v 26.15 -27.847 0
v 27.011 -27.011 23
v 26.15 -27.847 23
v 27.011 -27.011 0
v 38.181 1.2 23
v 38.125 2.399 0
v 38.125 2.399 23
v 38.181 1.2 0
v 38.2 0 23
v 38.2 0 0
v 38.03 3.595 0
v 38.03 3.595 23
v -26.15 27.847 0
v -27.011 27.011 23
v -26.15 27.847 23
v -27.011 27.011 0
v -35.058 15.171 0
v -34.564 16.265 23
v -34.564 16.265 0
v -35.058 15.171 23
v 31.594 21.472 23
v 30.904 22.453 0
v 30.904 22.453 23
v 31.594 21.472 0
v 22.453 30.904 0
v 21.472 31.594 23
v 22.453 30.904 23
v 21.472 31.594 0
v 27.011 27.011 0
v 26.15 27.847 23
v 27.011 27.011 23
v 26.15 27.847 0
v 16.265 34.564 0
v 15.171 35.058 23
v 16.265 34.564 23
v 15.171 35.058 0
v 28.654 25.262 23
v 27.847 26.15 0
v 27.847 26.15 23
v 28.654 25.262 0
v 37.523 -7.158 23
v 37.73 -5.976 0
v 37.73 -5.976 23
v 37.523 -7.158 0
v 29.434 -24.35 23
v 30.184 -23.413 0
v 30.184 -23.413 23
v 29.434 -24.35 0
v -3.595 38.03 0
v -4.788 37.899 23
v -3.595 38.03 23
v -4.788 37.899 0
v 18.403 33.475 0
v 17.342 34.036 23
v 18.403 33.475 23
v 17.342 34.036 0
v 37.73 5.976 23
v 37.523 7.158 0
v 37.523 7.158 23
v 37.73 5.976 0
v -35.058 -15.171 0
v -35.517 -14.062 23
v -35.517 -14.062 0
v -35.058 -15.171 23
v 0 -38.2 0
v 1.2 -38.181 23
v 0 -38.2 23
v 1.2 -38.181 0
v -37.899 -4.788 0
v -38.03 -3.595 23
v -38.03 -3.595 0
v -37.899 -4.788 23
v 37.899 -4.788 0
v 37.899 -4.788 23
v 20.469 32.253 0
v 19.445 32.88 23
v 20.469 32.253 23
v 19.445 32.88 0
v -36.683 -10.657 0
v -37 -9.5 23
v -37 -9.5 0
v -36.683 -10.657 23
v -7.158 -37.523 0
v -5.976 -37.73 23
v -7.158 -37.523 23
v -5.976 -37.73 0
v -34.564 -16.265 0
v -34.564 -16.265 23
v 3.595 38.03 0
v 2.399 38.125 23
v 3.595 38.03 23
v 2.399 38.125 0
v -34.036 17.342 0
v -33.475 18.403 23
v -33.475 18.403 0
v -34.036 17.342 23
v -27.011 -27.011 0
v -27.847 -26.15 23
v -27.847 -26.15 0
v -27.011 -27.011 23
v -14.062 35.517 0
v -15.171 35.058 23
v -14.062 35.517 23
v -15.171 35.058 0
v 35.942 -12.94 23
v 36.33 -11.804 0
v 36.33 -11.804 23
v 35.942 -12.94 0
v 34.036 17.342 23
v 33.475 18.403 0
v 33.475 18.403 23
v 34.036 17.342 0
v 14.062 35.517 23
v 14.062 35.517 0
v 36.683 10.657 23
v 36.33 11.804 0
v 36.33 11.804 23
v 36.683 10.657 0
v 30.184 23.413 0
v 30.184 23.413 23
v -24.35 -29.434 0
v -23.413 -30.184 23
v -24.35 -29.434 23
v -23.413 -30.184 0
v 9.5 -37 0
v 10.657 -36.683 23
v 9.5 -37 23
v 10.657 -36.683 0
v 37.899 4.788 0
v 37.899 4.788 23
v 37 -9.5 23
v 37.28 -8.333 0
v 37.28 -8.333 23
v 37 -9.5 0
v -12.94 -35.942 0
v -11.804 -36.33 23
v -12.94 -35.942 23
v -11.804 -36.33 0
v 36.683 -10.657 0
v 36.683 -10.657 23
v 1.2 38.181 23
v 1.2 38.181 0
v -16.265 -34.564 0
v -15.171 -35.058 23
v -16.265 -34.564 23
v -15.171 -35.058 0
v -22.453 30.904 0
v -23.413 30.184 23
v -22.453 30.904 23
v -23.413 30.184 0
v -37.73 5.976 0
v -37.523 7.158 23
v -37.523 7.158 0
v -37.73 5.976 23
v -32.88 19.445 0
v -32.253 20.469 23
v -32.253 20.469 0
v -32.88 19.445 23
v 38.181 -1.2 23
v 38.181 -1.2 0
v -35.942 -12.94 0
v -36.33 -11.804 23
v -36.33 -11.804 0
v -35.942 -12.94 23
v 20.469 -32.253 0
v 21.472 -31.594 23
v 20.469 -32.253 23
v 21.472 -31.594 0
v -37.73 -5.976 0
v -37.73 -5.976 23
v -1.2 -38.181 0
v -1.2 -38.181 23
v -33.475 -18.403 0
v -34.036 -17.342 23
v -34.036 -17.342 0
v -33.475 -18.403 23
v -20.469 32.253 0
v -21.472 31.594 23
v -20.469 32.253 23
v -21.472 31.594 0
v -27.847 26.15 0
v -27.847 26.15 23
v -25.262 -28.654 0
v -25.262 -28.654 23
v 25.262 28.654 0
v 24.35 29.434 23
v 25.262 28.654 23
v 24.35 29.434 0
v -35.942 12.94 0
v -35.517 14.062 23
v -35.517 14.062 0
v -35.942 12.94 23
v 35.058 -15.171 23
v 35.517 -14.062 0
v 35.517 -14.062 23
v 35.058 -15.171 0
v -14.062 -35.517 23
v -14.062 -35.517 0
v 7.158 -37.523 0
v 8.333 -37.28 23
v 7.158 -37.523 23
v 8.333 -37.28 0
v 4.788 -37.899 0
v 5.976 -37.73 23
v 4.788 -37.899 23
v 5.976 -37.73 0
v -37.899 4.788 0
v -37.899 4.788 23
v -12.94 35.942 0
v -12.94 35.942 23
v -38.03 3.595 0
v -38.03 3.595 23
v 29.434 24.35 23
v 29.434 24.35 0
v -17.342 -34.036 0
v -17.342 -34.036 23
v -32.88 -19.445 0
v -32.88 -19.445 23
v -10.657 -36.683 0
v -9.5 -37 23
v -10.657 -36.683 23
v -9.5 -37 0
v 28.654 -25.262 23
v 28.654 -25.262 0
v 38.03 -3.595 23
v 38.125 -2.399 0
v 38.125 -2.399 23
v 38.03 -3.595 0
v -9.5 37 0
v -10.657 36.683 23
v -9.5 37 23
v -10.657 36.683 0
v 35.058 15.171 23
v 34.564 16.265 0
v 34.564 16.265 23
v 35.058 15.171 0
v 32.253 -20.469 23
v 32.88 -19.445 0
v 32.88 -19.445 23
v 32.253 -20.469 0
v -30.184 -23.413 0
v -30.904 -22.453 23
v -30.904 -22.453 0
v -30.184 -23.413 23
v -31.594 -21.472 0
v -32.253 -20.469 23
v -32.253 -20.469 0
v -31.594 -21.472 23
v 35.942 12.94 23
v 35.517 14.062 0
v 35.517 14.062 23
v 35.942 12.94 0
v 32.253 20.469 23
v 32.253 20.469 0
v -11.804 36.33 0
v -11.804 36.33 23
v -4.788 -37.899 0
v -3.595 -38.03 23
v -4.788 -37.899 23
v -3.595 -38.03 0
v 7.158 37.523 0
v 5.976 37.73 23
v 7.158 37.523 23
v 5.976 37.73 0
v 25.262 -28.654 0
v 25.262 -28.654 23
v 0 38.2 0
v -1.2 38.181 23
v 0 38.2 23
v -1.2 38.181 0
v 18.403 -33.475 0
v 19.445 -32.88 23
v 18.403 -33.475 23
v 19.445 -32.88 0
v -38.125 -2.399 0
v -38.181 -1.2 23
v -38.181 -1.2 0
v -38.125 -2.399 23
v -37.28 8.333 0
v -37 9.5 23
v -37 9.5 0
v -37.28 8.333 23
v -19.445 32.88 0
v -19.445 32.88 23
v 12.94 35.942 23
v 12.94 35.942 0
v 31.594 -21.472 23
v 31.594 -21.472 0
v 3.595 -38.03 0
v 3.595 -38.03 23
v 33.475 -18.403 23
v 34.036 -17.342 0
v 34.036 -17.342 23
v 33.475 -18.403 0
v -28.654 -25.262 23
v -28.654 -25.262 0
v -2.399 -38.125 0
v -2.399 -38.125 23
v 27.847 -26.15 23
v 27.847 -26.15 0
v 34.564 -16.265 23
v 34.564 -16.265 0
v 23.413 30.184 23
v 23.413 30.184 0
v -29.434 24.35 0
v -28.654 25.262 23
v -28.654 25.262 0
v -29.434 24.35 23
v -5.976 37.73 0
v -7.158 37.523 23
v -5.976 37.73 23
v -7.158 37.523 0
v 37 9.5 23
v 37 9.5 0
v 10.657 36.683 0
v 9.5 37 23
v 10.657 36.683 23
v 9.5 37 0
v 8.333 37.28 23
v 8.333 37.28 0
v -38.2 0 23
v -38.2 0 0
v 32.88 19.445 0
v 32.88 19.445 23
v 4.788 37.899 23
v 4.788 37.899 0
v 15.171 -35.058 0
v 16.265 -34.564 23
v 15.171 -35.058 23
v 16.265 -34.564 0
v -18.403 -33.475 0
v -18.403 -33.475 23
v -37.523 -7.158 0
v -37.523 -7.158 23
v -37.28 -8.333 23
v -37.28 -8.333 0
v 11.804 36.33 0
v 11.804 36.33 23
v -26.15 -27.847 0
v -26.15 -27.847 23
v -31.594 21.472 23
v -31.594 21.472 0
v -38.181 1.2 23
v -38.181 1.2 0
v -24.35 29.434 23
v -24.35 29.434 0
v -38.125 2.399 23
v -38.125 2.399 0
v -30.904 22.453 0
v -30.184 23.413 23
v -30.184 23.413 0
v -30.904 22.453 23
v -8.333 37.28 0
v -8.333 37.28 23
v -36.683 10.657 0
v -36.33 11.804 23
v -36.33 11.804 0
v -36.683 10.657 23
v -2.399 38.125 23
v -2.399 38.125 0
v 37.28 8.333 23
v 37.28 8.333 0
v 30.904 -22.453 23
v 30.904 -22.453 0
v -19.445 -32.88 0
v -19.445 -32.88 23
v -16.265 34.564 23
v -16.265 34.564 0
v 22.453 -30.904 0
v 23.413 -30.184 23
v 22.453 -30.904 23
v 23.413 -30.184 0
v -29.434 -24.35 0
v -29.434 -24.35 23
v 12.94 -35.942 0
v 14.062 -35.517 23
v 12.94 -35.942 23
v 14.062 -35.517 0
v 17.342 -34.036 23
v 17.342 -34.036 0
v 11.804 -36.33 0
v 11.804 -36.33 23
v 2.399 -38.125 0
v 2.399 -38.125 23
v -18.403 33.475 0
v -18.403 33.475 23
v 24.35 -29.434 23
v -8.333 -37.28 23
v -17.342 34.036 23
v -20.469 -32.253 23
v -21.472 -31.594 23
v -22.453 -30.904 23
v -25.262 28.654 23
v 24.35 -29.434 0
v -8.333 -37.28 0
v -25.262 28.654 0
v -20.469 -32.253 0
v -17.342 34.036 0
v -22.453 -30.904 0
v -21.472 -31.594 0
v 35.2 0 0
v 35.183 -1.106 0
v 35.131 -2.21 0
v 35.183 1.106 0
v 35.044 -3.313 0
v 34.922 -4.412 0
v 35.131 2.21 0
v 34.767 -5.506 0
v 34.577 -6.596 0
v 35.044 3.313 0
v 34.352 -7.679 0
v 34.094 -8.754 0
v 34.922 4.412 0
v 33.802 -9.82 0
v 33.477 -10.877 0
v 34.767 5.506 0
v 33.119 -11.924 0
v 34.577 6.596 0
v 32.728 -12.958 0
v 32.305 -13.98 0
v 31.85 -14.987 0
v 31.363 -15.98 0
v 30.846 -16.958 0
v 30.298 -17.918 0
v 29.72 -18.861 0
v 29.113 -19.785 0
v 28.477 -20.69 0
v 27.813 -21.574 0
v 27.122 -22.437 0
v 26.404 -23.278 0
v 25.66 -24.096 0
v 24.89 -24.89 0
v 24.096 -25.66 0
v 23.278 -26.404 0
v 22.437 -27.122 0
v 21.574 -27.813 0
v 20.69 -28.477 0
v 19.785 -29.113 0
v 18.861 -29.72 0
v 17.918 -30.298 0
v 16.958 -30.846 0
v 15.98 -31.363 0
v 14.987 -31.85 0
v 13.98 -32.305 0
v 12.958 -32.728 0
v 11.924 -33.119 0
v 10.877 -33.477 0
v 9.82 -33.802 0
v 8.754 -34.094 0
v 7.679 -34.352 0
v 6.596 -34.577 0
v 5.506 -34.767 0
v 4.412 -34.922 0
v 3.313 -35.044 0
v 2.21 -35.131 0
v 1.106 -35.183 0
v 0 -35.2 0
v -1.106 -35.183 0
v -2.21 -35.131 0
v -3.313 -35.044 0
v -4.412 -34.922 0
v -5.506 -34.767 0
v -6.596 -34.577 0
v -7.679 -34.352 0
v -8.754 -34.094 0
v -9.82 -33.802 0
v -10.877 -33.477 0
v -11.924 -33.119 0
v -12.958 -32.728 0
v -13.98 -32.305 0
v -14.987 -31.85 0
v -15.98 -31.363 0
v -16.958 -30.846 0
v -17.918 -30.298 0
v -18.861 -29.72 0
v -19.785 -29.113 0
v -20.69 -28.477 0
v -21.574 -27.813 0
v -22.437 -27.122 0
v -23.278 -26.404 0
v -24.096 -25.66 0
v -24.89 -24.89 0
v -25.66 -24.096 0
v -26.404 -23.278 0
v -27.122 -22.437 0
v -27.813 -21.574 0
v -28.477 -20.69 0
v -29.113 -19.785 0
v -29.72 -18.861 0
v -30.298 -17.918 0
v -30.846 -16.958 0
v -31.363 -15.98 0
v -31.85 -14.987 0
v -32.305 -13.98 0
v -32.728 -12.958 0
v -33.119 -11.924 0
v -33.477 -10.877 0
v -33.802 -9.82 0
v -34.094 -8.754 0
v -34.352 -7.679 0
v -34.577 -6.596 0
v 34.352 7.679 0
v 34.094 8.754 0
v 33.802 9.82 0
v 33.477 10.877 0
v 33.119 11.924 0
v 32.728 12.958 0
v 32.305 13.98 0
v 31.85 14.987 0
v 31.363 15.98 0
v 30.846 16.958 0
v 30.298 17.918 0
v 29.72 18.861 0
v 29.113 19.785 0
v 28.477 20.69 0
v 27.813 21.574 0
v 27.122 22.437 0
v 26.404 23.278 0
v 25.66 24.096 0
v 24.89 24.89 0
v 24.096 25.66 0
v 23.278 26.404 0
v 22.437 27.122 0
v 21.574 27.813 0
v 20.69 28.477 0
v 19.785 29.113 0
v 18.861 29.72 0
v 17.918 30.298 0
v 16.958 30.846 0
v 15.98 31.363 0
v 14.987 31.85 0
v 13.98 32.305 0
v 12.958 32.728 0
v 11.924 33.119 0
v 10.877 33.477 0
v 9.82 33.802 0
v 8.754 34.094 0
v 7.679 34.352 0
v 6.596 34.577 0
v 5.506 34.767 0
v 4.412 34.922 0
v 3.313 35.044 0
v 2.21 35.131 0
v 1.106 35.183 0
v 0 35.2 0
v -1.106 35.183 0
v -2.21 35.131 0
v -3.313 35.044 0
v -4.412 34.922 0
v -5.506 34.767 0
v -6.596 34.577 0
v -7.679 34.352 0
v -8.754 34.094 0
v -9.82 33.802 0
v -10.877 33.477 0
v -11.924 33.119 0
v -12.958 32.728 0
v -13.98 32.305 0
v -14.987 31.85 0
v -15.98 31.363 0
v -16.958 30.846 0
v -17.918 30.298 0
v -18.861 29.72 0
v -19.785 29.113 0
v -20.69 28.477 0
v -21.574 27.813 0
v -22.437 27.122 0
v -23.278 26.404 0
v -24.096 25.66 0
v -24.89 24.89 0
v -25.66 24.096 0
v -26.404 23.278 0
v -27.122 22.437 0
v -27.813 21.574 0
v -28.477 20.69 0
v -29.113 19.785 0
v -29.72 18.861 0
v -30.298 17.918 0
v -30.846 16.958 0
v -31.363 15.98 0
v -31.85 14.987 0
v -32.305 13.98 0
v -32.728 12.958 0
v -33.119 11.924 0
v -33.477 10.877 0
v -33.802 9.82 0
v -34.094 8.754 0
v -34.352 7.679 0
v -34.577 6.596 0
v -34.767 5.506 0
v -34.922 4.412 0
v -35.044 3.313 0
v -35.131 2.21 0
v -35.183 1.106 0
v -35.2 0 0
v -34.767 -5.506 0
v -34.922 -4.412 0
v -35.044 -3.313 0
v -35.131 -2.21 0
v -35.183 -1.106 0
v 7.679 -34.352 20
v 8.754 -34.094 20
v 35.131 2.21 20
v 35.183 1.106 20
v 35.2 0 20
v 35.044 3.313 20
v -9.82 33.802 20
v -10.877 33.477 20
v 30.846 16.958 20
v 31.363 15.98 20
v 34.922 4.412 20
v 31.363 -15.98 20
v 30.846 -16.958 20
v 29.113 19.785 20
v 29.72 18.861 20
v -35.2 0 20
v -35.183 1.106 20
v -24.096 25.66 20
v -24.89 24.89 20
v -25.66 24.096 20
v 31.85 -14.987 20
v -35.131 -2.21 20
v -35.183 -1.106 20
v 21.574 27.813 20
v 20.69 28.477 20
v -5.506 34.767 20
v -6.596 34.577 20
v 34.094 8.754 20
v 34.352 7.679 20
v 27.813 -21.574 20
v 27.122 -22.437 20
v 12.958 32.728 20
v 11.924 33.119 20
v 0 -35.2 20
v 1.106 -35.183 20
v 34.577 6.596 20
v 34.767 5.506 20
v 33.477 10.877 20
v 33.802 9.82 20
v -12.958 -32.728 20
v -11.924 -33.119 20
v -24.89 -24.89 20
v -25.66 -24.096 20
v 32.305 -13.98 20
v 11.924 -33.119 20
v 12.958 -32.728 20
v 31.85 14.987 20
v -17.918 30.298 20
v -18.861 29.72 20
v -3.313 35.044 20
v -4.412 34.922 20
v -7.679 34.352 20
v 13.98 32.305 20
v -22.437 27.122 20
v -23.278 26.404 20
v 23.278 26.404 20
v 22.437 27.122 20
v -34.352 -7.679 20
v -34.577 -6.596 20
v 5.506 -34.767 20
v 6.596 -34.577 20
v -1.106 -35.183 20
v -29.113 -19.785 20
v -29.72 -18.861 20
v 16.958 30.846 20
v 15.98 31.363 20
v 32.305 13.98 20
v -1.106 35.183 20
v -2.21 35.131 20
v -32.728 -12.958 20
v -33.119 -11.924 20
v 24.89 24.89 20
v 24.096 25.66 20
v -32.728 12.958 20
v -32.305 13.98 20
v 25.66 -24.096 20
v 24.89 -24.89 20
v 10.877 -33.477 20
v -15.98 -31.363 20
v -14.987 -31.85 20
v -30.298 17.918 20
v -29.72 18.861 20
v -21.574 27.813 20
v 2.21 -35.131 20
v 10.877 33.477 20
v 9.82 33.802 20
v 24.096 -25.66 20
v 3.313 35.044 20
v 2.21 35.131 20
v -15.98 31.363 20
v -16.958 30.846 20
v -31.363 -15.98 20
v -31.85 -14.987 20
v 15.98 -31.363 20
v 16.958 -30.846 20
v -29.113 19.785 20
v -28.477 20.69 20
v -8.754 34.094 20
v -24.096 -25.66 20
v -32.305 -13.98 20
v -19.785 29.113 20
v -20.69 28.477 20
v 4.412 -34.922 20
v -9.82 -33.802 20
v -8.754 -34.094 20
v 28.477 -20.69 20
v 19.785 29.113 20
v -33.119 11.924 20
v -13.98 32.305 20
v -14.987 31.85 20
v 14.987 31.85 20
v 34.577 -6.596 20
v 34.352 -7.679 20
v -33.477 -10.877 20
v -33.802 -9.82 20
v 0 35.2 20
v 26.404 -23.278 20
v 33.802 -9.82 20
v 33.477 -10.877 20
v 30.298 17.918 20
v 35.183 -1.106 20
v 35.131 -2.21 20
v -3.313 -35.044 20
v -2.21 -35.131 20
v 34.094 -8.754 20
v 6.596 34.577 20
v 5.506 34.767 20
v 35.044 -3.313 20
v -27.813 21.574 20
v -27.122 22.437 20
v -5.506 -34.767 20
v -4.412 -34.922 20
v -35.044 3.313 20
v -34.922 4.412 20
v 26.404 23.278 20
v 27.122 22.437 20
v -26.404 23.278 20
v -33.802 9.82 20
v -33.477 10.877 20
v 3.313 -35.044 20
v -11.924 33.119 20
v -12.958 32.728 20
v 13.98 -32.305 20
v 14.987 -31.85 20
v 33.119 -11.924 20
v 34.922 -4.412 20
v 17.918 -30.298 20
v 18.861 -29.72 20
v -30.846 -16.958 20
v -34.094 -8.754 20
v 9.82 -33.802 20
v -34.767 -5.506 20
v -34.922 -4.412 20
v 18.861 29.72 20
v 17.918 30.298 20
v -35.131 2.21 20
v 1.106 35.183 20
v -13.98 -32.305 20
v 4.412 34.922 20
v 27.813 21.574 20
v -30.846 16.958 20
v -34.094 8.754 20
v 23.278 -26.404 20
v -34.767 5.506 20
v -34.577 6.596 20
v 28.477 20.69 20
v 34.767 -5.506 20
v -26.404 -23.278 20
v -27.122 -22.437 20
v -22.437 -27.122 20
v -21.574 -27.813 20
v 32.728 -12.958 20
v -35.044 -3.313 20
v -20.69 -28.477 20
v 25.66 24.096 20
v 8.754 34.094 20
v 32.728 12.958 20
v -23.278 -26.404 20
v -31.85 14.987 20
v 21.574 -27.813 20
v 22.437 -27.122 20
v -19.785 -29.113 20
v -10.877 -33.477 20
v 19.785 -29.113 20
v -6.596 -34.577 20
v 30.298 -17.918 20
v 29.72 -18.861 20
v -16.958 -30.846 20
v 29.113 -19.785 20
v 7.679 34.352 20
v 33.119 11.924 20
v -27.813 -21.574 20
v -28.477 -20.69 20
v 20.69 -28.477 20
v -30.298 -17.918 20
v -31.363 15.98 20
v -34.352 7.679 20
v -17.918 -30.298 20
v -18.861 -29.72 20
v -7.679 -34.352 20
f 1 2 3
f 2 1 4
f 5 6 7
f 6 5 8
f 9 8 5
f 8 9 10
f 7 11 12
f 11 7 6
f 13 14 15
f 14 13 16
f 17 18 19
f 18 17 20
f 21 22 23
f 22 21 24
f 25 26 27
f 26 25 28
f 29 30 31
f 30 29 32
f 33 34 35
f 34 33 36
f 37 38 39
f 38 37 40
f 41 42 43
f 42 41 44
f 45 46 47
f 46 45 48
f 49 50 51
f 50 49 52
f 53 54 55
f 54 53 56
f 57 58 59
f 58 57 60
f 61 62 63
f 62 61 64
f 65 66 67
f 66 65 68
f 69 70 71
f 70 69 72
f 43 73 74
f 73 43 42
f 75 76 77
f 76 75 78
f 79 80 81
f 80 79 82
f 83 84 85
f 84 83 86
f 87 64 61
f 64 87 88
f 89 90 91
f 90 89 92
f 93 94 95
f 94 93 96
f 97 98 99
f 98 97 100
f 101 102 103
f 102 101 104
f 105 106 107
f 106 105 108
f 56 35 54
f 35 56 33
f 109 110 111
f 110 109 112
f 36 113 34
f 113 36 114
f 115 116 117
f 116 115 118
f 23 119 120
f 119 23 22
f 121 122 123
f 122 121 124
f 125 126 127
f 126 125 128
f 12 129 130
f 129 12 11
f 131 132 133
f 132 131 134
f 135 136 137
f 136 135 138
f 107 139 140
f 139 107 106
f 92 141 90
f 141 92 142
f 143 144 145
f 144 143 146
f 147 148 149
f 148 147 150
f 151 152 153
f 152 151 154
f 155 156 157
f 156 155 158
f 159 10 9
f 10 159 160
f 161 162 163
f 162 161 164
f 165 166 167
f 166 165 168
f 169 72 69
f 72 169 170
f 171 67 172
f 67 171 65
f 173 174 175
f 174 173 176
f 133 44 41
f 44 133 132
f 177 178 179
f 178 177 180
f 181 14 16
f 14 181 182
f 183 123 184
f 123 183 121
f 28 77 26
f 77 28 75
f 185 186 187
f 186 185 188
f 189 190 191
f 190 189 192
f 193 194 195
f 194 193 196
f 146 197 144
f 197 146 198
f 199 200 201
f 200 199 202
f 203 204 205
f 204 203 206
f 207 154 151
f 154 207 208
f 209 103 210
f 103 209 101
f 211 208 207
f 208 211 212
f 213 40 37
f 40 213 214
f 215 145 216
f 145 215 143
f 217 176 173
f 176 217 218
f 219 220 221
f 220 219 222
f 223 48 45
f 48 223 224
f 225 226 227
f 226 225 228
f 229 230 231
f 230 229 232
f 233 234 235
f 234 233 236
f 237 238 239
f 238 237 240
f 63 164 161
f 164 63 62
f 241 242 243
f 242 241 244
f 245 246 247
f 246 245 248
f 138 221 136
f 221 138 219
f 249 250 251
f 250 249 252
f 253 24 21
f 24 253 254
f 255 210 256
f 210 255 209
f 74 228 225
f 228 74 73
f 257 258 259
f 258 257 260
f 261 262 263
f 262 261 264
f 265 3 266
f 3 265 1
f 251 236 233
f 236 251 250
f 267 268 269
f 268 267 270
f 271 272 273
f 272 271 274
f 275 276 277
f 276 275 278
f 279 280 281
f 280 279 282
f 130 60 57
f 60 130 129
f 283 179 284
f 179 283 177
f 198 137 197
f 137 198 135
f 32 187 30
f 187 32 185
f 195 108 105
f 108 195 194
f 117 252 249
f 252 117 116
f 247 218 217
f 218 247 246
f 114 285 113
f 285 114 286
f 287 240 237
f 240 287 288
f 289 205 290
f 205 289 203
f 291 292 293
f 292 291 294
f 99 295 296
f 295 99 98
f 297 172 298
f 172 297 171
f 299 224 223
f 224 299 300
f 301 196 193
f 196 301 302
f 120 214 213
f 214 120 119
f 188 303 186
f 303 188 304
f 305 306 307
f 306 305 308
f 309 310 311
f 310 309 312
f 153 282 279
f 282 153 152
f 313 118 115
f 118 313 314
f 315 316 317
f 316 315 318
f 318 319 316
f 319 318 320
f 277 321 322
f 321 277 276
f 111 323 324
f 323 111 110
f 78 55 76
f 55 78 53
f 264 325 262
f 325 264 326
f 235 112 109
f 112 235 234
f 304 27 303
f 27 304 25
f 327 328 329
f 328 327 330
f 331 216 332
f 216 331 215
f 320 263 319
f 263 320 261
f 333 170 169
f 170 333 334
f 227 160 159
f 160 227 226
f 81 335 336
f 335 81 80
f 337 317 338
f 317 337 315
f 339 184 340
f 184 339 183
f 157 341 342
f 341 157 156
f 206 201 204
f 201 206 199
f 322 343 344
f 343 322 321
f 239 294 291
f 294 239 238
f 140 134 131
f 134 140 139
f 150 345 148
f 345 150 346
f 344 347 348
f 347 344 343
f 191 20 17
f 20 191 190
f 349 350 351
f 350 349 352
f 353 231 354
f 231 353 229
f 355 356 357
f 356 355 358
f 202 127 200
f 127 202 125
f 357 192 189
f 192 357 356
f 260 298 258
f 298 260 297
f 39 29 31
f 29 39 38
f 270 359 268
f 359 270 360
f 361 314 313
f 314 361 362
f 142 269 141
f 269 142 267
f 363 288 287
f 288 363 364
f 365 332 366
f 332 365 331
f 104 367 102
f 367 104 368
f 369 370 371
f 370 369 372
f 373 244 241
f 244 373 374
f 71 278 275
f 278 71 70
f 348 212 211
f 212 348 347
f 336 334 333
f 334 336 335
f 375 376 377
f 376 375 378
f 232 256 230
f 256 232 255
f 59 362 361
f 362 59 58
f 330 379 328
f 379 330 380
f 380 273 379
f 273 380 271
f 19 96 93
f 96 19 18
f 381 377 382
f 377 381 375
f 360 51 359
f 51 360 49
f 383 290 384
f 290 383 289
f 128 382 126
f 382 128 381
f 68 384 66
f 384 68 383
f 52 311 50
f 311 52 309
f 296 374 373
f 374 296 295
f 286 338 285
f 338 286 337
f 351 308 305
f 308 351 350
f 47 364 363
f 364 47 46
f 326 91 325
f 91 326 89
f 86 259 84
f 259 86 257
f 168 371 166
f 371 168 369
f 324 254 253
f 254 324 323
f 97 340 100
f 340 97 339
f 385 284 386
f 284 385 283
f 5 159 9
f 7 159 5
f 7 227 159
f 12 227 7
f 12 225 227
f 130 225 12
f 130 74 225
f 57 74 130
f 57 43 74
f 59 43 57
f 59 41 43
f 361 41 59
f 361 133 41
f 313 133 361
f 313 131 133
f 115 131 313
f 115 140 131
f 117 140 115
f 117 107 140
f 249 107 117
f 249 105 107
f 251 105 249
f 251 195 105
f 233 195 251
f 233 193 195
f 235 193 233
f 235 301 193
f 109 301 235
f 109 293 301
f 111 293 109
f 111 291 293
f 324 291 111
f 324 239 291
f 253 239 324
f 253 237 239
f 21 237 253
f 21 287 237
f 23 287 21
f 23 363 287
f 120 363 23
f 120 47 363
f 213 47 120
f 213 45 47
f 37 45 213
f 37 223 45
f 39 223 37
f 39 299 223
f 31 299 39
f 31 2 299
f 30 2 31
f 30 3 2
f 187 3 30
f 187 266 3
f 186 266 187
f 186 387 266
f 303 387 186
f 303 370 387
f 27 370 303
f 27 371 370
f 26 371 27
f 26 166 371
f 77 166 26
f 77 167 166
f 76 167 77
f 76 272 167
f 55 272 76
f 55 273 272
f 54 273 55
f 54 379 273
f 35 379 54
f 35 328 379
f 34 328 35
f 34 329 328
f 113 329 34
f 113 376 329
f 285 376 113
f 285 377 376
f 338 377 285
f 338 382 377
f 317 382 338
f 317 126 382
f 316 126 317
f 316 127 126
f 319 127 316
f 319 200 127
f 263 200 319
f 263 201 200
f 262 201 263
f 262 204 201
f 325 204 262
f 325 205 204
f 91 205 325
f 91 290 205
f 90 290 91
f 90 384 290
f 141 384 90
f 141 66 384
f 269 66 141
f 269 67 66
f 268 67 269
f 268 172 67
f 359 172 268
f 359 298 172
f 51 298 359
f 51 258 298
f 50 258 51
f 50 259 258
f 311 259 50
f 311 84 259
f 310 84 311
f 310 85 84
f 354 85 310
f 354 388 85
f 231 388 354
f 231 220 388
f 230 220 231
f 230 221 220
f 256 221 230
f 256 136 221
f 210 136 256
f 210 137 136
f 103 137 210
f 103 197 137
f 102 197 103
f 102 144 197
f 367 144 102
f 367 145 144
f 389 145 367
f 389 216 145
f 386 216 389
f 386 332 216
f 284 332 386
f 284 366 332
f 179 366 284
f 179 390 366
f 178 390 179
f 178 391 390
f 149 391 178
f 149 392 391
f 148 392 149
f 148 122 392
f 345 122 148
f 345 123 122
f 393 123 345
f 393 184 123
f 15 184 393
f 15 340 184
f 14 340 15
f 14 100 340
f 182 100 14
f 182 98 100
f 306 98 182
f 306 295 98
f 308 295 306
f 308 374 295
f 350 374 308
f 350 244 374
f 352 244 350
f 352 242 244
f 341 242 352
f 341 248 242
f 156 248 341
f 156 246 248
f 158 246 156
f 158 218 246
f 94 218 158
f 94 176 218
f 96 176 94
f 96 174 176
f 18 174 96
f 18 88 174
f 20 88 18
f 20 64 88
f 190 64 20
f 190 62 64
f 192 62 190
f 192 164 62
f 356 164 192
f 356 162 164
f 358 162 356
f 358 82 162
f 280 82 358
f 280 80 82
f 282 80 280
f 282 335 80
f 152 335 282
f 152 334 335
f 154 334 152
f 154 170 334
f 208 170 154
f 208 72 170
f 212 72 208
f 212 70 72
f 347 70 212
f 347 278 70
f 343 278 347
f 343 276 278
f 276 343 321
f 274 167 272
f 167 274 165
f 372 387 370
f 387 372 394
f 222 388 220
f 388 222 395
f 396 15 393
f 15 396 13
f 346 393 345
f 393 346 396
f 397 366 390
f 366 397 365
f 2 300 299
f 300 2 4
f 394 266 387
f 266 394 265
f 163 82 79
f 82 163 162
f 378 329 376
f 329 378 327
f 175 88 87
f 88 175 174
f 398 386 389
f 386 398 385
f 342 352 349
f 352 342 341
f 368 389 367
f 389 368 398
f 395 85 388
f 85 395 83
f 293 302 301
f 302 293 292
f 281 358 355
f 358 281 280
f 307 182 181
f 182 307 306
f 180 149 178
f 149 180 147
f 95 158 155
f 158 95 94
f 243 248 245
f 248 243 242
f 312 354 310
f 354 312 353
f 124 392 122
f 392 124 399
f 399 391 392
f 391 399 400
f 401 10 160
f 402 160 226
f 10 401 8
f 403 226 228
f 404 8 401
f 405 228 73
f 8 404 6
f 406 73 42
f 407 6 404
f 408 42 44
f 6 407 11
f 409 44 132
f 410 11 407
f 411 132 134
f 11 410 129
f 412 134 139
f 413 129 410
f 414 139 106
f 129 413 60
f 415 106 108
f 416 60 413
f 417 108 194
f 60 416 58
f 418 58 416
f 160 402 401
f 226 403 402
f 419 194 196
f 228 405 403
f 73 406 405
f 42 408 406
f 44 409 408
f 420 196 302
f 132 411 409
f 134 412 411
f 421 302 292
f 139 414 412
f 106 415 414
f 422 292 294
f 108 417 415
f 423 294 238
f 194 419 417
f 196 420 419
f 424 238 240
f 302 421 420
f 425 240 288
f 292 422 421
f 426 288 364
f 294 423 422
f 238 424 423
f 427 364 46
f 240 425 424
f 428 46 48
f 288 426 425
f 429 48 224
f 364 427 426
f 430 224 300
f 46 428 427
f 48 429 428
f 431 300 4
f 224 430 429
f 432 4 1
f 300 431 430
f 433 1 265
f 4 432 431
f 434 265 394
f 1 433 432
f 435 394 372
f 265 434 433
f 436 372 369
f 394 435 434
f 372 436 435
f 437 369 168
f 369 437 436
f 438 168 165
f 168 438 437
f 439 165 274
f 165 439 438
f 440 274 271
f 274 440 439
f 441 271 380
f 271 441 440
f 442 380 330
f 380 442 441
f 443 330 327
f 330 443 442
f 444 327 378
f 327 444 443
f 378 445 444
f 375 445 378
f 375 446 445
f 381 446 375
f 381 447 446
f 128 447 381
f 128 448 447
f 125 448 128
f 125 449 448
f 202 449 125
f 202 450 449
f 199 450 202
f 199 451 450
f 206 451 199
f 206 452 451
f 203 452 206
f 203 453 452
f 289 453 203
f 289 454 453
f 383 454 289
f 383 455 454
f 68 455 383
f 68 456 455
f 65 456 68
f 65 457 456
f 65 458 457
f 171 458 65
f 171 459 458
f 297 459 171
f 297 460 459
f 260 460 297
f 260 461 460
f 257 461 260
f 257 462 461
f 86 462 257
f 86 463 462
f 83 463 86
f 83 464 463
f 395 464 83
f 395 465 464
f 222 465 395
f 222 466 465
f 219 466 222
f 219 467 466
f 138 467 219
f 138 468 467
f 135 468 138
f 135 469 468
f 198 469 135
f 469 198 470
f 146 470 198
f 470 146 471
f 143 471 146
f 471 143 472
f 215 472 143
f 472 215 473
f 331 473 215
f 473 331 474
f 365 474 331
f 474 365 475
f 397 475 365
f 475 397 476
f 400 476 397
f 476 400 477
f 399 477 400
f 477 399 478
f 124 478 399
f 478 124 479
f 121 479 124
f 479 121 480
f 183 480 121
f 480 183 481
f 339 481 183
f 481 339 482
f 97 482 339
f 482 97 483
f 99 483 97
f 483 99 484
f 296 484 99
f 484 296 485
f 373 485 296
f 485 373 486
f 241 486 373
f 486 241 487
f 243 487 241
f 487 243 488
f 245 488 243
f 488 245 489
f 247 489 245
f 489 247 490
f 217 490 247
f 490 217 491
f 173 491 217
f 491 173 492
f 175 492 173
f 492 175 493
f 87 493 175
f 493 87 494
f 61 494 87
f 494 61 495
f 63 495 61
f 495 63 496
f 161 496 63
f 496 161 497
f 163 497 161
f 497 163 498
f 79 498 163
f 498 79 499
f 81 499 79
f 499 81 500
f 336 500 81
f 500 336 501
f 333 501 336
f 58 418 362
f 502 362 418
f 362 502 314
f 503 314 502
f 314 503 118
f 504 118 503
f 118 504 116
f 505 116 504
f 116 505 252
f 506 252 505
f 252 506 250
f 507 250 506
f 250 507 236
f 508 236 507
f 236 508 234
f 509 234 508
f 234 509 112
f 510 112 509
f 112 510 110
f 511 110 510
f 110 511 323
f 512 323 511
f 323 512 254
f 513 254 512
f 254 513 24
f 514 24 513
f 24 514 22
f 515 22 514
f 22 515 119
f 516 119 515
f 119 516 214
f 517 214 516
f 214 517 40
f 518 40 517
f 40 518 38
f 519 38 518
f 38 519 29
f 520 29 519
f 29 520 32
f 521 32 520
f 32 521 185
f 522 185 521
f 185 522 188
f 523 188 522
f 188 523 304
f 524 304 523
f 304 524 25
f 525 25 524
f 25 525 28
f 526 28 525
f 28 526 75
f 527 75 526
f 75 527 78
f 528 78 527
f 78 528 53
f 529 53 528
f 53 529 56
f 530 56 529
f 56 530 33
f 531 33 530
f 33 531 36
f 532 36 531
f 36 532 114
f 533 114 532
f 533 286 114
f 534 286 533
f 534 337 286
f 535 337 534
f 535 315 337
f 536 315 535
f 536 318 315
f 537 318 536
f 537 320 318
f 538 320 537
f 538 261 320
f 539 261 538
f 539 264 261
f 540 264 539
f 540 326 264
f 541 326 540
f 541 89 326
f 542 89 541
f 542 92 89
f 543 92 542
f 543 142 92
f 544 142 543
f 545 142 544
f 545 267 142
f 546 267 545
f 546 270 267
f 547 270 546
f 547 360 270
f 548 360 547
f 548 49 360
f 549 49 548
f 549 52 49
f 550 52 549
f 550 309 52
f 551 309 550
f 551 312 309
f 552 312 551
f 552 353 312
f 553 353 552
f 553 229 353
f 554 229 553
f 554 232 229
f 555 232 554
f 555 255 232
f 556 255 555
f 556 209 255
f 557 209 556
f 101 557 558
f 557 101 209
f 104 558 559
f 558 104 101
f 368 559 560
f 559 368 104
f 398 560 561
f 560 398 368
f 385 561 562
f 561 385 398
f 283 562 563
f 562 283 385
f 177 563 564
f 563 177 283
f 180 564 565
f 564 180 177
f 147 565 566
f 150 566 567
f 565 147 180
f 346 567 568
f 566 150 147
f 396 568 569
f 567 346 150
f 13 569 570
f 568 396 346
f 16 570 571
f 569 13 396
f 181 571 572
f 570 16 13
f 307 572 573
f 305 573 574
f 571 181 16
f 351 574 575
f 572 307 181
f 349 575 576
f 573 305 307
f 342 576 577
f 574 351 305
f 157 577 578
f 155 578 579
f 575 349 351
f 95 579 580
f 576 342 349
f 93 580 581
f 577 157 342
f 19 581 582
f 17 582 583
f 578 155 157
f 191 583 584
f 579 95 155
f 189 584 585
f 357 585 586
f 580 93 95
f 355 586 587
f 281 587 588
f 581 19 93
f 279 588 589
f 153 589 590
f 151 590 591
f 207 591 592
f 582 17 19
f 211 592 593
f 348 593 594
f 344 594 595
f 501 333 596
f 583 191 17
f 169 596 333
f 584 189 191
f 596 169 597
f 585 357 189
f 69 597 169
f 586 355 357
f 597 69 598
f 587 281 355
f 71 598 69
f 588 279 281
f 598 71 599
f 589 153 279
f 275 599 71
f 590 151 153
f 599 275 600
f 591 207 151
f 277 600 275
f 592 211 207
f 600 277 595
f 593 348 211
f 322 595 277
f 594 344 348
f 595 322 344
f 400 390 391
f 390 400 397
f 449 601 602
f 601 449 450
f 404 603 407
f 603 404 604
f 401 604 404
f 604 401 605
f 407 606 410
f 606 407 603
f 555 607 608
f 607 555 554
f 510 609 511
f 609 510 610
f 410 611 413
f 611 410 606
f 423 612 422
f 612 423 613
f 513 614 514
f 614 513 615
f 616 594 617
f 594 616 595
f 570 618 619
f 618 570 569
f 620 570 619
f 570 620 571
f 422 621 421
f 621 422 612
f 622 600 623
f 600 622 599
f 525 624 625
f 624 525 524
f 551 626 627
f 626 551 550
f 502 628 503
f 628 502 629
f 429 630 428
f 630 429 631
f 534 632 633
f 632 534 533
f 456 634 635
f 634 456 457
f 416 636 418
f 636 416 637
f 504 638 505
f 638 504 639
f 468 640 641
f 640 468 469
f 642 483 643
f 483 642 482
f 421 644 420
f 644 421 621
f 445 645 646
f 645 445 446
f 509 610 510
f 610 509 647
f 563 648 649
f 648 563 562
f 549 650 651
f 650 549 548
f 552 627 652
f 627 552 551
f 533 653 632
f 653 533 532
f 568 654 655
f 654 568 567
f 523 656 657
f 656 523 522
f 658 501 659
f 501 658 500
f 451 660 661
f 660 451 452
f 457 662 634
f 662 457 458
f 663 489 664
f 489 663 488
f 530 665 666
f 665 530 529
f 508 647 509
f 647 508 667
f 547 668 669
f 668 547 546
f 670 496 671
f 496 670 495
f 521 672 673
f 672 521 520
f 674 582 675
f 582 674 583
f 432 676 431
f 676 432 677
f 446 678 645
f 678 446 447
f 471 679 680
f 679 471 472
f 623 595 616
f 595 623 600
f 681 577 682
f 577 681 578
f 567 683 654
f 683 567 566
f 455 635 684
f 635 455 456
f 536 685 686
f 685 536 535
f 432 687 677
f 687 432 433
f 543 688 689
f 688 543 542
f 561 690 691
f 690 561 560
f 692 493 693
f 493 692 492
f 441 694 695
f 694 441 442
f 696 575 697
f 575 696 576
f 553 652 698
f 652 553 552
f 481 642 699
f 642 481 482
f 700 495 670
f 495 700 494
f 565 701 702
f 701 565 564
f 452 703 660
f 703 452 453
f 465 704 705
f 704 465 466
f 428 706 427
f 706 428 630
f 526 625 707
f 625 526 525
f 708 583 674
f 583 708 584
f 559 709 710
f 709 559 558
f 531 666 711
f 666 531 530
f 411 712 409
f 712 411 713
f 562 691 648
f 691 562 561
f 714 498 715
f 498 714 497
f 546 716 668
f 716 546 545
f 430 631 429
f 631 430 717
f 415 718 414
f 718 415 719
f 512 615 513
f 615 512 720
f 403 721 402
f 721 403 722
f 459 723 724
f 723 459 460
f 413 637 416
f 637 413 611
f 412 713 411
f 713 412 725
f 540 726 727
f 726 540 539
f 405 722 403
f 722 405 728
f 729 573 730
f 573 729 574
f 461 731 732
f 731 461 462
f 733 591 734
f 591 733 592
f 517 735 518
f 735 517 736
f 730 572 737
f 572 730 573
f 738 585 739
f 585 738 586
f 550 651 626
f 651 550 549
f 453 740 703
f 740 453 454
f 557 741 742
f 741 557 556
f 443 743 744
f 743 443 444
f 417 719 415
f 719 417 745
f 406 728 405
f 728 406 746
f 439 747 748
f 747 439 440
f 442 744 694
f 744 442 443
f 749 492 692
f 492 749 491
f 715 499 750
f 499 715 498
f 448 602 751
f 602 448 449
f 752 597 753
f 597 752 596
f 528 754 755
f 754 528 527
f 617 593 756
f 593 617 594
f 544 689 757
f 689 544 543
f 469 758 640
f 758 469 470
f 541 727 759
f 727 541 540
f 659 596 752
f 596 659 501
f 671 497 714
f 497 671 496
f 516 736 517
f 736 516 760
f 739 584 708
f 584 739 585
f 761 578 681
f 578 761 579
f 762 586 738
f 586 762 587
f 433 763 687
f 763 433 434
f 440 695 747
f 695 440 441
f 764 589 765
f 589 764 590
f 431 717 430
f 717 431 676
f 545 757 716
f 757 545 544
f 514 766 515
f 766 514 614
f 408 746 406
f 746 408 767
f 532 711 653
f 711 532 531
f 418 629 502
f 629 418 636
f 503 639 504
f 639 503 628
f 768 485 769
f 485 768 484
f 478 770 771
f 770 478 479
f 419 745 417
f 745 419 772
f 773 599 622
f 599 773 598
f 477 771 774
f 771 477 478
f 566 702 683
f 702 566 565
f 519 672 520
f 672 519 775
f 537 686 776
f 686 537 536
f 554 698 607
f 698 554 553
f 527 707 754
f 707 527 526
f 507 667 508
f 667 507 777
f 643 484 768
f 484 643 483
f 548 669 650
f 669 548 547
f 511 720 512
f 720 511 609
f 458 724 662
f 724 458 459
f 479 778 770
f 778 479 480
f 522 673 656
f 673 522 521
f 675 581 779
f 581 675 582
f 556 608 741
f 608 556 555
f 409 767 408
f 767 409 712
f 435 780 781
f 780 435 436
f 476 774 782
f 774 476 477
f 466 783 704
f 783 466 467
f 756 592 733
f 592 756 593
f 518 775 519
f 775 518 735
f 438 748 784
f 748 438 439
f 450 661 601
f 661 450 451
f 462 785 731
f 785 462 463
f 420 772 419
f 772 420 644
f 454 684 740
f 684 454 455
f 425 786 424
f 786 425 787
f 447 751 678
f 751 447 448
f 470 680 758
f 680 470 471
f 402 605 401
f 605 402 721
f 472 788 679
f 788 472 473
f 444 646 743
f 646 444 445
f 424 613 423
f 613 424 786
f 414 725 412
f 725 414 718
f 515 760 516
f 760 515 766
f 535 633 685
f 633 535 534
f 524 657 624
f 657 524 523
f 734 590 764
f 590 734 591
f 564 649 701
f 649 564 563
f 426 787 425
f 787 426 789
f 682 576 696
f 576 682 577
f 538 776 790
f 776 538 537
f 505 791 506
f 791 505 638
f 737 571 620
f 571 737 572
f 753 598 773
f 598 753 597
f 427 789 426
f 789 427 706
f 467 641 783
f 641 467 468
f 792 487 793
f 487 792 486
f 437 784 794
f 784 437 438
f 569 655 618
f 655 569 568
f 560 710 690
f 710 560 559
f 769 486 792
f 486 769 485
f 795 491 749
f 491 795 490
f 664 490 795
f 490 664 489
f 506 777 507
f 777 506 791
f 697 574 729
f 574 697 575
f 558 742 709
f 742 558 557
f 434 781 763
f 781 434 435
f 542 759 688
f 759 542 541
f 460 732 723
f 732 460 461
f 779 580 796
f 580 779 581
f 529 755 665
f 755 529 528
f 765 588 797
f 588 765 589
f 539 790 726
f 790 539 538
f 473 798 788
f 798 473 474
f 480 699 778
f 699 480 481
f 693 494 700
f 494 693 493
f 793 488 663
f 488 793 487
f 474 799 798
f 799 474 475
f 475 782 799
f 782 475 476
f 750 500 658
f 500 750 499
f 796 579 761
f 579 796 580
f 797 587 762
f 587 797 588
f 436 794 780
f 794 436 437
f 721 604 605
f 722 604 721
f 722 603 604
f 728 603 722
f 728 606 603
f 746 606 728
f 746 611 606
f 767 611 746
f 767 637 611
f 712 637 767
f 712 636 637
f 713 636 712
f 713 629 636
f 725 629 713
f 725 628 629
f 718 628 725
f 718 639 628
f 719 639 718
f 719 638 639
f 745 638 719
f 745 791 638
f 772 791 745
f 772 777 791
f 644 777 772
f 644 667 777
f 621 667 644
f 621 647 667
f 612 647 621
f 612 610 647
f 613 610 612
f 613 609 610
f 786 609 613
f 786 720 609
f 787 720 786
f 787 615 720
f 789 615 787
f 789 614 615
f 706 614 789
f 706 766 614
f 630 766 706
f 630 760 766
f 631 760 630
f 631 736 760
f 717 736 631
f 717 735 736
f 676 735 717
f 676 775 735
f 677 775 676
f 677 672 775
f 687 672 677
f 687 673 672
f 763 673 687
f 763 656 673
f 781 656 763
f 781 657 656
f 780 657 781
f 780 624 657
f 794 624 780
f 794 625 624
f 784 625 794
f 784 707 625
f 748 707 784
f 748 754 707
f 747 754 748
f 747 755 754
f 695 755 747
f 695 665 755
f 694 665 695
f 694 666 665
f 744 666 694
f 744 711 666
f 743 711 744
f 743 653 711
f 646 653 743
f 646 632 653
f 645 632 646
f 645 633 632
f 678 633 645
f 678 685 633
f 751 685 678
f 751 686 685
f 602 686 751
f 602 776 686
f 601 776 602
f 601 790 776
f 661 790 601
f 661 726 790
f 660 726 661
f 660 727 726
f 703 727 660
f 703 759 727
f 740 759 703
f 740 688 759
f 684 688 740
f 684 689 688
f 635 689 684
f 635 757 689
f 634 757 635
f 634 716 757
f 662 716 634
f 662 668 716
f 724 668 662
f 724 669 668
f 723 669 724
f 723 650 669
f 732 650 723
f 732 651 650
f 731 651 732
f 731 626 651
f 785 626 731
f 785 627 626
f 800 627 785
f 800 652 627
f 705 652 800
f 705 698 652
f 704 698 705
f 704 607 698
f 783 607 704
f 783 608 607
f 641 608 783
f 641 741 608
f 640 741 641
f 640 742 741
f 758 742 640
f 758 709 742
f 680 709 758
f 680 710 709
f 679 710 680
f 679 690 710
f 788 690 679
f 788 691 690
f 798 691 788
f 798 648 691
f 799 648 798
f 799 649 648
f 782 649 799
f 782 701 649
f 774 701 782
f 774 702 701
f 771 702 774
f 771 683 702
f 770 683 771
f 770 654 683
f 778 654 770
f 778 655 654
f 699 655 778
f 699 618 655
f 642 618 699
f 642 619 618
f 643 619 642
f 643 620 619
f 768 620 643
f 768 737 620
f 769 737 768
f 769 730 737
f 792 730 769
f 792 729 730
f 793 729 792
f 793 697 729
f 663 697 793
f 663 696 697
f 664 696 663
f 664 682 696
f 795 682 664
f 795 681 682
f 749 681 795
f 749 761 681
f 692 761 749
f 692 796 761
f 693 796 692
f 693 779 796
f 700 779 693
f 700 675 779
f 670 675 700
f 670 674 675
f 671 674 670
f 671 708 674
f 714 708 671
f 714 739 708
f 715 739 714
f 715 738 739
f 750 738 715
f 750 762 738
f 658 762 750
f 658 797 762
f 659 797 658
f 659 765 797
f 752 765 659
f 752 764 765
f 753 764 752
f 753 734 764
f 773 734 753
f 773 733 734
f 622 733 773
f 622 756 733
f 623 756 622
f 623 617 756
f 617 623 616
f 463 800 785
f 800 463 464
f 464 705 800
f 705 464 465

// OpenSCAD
// Variante A: Ueberstuelp-Kappe fuer das verkuerzte Piraten-Fernrohr
// -> passend, wenn 70 mm der AUSSENdurchmesser des Rohrs ist.
// Masse aendern, dann F6 (Render) und als STL exportieren.

tube_outer_d = 70;   // gemessener Aussendurchmesser des Rohrs
clearance    = 0.4;  // Spiel (zu stramm? groesser. zu locker? kleiner)
wall         = 3;    // Wandstaerke der Kappe
skirt_h      = 20;   // wie weit die Kappe ueber das Rohr greift
top_th       = 3;    // Dicke des geschlossenen Deckels

$fn = 200;

inner_d = tube_outer_d + clearance;
outer_d = inner_d + 2*wall;

difference() {
    cylinder(d = outer_d, h = skirt_h + top_th);           // Vollzylinder
    translate([0,0,-0.01])
        cylinder(d = inner_d, h = skirt_h + 0.01);         // Bohrung fuers Rohr
}
